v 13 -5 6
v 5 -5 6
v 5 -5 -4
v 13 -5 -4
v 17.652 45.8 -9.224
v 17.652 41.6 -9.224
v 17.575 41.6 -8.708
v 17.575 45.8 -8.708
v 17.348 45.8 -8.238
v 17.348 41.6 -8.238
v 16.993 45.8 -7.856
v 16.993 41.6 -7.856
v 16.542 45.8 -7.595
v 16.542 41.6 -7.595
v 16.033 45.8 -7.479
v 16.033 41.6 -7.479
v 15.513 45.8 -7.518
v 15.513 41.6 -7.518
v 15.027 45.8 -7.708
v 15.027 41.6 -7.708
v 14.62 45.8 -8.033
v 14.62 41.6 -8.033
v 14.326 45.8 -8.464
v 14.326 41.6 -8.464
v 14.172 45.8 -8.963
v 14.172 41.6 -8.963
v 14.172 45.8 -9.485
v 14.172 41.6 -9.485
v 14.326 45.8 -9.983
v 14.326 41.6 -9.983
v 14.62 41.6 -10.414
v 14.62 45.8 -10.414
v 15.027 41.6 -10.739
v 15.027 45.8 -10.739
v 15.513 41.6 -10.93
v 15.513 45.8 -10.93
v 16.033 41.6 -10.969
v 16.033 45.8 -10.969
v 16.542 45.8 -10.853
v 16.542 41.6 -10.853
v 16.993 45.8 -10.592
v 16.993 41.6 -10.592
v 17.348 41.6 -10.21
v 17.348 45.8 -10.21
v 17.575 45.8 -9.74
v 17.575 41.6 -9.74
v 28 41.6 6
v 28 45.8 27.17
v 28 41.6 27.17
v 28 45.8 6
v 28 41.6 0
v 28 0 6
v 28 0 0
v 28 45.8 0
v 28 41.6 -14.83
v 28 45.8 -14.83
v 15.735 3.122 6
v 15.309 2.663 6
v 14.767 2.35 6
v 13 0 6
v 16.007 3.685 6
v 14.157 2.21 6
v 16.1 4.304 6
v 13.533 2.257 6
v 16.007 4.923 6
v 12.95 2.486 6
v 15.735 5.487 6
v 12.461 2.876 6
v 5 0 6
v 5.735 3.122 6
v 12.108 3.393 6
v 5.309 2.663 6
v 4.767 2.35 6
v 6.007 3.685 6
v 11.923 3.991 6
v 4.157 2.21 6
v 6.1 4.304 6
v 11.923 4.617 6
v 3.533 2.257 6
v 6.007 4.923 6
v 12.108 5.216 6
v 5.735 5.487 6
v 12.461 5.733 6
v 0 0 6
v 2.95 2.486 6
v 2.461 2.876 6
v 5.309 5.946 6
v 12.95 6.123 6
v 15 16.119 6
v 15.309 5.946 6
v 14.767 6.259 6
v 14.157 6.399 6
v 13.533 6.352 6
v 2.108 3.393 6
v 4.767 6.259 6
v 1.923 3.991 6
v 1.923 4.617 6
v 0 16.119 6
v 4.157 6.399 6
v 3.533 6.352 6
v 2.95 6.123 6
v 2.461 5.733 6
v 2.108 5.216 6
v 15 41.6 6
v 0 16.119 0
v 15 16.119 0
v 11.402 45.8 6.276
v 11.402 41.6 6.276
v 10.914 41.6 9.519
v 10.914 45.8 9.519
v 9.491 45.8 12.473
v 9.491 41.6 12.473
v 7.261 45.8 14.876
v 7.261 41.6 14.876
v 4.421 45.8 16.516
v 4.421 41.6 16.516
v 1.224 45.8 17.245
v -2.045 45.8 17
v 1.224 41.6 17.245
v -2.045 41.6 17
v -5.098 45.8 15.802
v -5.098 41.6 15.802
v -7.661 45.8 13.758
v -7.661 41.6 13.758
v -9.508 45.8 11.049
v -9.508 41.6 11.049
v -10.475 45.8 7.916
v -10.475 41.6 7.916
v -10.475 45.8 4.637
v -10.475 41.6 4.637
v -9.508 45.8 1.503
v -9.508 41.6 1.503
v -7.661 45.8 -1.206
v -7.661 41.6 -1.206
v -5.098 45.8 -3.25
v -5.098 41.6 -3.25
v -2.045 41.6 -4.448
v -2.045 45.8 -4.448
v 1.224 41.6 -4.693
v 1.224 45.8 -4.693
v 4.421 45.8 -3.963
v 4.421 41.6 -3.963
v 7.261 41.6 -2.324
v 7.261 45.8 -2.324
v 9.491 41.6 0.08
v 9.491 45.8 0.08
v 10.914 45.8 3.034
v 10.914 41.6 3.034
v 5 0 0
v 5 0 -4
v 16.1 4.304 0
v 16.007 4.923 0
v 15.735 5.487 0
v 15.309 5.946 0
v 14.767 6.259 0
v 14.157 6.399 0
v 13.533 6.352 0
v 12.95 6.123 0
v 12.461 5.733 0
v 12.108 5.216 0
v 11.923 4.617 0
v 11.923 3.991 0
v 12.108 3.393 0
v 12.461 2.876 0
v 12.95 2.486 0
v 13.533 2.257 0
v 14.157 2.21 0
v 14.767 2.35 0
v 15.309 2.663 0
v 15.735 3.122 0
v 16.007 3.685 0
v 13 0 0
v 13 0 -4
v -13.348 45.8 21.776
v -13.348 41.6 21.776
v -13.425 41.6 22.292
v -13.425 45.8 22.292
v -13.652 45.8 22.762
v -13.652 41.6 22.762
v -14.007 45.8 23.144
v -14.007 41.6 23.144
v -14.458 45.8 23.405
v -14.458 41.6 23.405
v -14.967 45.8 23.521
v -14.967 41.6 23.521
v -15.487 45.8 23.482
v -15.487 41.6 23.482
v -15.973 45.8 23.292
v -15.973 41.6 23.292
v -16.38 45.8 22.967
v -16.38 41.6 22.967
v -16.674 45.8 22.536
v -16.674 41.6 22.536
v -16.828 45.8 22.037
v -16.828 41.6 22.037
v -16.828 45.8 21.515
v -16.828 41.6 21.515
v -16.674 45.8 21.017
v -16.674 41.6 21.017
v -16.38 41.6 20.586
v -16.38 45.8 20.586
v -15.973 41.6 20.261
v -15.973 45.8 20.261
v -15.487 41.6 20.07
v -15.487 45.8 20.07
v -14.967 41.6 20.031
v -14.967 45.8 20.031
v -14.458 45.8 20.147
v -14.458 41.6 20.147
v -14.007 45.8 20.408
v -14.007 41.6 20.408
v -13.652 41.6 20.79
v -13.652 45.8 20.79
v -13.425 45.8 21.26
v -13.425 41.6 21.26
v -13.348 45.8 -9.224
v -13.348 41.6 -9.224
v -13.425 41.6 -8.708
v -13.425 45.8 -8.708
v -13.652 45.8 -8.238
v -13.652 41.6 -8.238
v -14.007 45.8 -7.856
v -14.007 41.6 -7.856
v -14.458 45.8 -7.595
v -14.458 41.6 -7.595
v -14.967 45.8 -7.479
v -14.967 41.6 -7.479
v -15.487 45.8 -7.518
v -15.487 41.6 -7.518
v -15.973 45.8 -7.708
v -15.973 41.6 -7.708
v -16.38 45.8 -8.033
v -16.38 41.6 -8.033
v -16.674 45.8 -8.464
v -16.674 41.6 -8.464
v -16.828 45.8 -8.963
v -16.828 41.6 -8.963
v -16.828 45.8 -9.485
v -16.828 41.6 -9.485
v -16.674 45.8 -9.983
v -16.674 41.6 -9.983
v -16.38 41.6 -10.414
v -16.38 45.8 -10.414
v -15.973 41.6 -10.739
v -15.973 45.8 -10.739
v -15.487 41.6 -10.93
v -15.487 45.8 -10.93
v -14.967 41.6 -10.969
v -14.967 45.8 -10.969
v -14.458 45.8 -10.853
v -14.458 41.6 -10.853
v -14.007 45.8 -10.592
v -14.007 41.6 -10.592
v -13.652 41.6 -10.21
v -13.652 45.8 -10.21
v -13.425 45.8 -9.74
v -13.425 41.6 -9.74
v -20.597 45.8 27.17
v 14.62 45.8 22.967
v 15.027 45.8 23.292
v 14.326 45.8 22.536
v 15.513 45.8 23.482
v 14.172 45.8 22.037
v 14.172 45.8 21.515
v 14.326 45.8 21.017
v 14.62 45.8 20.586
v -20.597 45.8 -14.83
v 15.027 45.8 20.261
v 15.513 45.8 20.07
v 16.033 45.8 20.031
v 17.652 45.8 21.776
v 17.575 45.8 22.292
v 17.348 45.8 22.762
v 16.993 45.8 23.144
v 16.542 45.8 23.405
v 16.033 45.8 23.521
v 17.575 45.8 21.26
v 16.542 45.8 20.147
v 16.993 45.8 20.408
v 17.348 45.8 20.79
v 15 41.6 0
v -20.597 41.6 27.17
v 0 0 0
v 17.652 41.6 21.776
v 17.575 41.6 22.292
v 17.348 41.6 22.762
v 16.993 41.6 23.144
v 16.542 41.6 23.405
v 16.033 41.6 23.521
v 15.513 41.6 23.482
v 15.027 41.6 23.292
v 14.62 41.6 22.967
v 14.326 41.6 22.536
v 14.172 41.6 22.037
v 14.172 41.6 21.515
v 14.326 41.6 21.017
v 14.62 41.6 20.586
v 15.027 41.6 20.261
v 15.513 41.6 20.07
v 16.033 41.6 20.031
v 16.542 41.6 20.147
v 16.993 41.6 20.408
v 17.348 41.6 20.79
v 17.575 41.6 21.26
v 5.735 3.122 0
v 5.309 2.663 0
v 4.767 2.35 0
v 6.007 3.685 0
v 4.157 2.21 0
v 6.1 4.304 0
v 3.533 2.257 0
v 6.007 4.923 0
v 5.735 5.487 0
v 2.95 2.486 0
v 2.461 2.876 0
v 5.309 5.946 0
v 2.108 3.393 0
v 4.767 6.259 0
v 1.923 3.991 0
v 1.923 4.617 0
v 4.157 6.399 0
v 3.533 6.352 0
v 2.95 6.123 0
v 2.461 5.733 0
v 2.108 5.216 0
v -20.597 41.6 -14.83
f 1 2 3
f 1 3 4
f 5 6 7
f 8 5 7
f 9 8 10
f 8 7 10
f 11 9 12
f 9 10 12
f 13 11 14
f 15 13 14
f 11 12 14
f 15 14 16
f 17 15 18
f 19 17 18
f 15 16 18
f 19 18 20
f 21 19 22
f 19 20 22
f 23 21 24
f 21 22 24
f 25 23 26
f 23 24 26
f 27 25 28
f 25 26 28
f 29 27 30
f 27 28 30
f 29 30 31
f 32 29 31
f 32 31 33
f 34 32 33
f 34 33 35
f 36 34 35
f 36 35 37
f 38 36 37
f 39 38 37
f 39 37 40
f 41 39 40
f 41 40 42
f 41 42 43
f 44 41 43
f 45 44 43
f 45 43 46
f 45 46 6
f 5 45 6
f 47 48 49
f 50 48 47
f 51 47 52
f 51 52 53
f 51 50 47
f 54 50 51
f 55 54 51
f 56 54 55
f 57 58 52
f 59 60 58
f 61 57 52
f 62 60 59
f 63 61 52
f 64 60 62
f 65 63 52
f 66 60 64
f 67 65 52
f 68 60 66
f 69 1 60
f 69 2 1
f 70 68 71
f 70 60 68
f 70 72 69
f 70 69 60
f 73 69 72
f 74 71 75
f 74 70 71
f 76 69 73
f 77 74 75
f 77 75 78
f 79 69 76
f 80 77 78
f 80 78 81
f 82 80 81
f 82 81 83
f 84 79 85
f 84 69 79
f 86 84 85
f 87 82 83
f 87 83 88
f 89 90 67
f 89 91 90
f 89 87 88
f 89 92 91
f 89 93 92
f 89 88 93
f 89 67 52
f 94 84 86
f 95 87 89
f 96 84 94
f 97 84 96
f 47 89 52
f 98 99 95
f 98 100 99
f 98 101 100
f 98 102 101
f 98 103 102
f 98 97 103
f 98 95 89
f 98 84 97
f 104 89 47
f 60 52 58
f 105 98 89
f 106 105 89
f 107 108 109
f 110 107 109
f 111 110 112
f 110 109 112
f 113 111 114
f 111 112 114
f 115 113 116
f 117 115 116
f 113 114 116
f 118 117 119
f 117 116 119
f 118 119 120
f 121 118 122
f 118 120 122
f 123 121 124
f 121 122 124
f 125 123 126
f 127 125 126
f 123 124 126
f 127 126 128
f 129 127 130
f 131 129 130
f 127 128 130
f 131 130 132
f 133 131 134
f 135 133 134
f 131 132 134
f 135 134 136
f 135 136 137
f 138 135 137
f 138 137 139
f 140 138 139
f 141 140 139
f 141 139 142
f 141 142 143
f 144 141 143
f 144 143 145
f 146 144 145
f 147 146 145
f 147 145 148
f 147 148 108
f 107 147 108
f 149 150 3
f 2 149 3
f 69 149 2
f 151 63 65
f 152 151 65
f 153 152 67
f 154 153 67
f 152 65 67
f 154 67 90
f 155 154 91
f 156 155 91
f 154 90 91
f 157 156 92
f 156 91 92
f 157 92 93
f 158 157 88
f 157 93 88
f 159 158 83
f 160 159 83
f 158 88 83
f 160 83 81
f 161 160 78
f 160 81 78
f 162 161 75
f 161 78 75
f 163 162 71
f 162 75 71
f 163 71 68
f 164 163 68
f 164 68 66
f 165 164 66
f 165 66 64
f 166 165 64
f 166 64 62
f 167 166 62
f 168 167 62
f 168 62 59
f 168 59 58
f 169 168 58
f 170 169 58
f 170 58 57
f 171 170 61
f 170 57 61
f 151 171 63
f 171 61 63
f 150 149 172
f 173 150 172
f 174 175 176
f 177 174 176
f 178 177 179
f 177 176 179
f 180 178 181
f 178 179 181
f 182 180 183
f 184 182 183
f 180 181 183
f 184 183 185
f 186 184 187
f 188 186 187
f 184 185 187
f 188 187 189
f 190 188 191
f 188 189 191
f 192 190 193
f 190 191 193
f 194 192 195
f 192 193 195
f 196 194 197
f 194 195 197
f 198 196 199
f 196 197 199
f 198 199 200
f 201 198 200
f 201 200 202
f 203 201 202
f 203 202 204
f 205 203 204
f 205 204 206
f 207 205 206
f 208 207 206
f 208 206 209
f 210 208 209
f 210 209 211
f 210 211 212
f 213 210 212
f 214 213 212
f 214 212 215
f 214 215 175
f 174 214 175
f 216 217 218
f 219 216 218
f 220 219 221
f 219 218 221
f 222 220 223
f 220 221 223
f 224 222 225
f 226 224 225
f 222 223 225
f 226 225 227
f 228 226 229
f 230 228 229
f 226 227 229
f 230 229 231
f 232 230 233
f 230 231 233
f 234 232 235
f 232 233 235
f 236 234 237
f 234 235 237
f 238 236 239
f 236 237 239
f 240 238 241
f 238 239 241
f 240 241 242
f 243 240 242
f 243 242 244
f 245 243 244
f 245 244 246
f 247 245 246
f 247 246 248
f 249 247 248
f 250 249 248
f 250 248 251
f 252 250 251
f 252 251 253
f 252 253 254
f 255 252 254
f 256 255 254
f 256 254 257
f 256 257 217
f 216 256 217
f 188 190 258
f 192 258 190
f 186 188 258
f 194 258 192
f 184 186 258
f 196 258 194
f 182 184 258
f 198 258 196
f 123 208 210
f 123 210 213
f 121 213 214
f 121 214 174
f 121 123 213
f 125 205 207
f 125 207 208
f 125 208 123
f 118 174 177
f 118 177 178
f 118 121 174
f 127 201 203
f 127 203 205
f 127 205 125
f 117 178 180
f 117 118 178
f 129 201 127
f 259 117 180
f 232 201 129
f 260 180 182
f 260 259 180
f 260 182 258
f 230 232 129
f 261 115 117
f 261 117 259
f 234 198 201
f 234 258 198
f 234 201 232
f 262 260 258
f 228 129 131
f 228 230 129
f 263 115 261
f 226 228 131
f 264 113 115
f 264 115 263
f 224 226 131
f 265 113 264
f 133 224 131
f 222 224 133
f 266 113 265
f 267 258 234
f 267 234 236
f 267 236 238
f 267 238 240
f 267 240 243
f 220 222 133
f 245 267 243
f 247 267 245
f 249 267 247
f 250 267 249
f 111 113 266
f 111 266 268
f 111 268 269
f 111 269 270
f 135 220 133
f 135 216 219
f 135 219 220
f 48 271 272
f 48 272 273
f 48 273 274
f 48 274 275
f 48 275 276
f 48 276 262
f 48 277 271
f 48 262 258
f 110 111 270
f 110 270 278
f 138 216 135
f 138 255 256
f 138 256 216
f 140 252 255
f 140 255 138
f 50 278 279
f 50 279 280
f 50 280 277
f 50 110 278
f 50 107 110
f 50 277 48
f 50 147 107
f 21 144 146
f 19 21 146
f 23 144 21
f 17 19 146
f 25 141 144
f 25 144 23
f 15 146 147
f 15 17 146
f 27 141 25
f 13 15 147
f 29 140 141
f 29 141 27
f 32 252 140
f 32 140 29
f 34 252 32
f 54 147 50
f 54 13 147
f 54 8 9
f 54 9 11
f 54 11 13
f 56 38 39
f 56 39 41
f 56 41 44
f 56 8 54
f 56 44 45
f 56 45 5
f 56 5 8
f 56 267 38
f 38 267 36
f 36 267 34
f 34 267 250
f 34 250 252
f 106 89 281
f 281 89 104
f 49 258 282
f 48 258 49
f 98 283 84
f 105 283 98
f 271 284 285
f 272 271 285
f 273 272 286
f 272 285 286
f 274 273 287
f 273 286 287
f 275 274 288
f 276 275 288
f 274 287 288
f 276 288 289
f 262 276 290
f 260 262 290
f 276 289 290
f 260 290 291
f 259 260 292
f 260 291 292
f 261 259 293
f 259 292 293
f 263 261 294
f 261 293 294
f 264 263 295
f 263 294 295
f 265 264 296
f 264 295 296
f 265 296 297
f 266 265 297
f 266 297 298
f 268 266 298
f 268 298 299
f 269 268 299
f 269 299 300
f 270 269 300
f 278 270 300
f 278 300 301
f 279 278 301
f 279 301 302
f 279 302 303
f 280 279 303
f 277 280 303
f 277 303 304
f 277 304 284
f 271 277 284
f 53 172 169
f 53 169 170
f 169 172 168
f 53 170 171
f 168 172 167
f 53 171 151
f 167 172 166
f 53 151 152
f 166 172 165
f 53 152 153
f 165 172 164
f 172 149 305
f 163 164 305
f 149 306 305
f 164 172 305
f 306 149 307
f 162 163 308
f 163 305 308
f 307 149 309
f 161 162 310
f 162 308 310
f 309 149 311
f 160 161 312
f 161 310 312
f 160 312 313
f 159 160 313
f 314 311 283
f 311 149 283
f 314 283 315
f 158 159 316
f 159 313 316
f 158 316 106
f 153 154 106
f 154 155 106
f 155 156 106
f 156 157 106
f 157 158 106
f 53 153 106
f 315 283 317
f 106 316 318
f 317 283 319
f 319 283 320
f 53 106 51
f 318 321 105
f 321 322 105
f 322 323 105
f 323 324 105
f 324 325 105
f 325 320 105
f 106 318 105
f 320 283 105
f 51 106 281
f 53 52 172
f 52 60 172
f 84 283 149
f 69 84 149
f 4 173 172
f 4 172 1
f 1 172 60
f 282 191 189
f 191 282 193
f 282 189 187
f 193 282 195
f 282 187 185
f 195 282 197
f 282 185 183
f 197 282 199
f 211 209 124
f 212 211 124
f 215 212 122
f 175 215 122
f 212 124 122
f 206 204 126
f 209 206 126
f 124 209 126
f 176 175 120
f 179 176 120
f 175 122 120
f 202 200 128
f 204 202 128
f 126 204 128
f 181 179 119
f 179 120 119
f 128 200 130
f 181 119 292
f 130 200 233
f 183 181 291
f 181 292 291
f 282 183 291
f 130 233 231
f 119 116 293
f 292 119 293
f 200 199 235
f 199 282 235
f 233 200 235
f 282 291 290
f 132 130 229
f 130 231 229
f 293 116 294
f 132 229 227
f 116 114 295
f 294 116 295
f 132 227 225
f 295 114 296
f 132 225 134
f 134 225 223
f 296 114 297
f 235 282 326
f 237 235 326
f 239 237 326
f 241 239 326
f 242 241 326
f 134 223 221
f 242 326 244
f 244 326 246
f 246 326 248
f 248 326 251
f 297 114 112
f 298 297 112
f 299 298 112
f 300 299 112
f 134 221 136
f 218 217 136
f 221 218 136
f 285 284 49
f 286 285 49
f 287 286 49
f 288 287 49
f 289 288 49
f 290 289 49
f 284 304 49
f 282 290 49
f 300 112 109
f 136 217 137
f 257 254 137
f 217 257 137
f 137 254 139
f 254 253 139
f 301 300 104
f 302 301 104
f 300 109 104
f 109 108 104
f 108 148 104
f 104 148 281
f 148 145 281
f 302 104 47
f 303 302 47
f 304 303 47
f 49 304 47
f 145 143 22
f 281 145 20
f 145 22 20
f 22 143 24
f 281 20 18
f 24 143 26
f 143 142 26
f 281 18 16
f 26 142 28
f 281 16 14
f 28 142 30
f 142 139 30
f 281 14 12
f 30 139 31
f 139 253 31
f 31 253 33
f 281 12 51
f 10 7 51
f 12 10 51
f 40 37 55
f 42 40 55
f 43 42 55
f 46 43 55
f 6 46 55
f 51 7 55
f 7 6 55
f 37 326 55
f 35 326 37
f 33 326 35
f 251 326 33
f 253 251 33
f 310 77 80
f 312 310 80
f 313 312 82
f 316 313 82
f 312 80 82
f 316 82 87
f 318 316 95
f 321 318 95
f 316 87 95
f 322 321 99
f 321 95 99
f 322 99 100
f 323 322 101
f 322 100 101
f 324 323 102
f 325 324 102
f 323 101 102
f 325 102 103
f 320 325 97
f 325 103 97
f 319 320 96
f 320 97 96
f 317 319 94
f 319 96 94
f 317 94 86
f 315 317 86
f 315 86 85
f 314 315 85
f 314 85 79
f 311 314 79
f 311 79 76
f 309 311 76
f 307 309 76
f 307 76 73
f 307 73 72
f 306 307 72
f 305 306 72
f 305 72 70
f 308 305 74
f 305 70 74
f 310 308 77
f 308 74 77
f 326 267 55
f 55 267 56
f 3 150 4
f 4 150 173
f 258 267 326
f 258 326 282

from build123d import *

# Parameters (mm, degrees)
SKETCH_1_W          = 18
SKETCH_1_H          = 50
EXTRUDE_1_DEPTH     = 6
SKETCH_3_R          = 2.1
CUT_EXTRUDE_2_DEPTH = 6
SKETCH_4_W          = 8
SKETCH_4_H          = 10
EXTRUDE_2_DEPTH     = 5
SKETCH_5_W          = 6
SKETCH_5_H          = 50
EXTRUDE_3_DEPTH     = 10
SKETCH_6_W          = 15
SKETCH_6_H          = 33.880633875
CUT_EXTRUDE_3_DEPTH = 10
SKETCH_7_W          = 18.194641251
SKETCH_7_H          = 8.438338953
CUT_EXTRUDE_4_DEPTH = 4.2
SKETCH_8_W          = 58.547266504
SKETCH_8_H          = 42
EXTRUDE_4_DEPTH     = 4.2
SKETCH_9_W          = 49.225807408
SKETCH_9_H          = 6.051517764
CUT_EXTRUDE_5_DEPTH = 9.95
SKETCH_15_R         = 1.75
CUT_EXTRUDE_6_DEPTH = 9.95
SKETCH_16_R         = 11
CUT_EXTRUDE_7_DEPTH = 10


with BuildPart() as part:
    # 草图1 → 凸台-拉伸1 (new body)
    with BuildSketch(Plane.XY):
        with Locations((9, 25)):
            Rectangle(SKETCH_1_W, SKETCH_1_H)
    extrude(amount=EXTRUDE_1_DEPTH)

    # 草图3 → 切除-拉伸2 (cut)
    with BuildSketch(Plane.XY.offset(6)):
        with Locations((4, 4.30447472)):
            Circle(SKETCH_3_R)
        with Locations((14, 4.30447472)):
            Circle(SKETCH_3_R)
    extrude(amount=-CUT_EXTRUDE_2_DEPTH, mode=Mode.SUBTRACT)

    # 草图4 → 凸台-拉伸2 (add)
    with BuildSketch(Plane.XZ):
        with Locations((9, 1)):
            Rectangle(SKETCH_4_W, SKETCH_4_H)
    extrude(amount=EXTRUDE_2_DEPTH)

    # 草图5 → 凸台-拉伸3 (add)
    with BuildSketch(Plane(origin=(18, 0, 0), x_dir=(0, 0, -1), z_dir=(1, 0, 0))):
        with Locations((-3, 25)):
            Rectangle(SKETCH_5_W, SKETCH_5_H)
    extrude(amount=EXTRUDE_3_DEPTH)

    # 草图6 → 切除-拉伸3 (cut)
    with BuildSketch(Plane.XY.offset(6)):
        with Locations((7.5, 33.059683062)):
            Rectangle(SKETCH_6_W, SKETCH_6_H)
    extrude(amount=-CUT_EXTRUDE_3_DEPTH, mode=Mode.SUBTRACT)

    # 草图7 → 切除-拉伸4 (cut)
    with BuildSketch(Plane(origin=(0, 50, 0), x_dir=(1, 0, 0), z_dir=(0, 1, 0))):
        with Locations((18.902679374, -1.780830523)):
            Rectangle(SKETCH_7_W, SKETCH_7_H)
    extrude(amount=-CUT_EXTRUDE_4_DEPTH, mode=Mode.SUBTRACT)

    # 草图8 → 凸台-拉伸4 (add)
    with BuildSketch(Plane(origin=(0, 45.8, 0), x_dir=(1, 0, 0), z_dir=(0, 1, 0))):
        with Locations((-1.273633252, -6.17)):
            Rectangle(SKETCH_8_W, SKETCH_8_H)
    extrude(amount=-EXTRUDE_4_DEPTH)

    # 草图9 → 切除-拉伸5 (cut)
    with BuildSketch(Plane.ZY.offset(30.547266504)):
        with Locations((2.557096296, 42.774241118)):
            Rectangle(SKETCH_9_W, SKETCH_9_H)
    extrude(amount=-CUT_EXTRUDE_5_DEPTH, mode=Mode.SUBTRACT)

    # 草图15 → 切除-拉伸6 (cut)
    with BuildSketch(Plane.XZ.offset(-41.6)):
        with Locations((15.90237217, -9.22379542)):
            Circle(SKETCH_15_R)
        with Locations((-15.09762783, -9.22379542)):
            Circle(SKETCH_15_R)
        with Locations((15.90237217, 21.77620458)):
            Circle(SKETCH_15_R)
        with Locations((-15.09762783, 21.77620458)):
            Circle(SKETCH_15_R)
    extrude(amount=-CUT_EXTRUDE_6_DEPTH, mode=Mode.SUBTRACT)

    # 草图16 → 切除-拉伸7 (cut)
    with BuildSketch(Plane.XZ.offset(-41.6)):
        with Locations((0.40237217, 6.27620458)):
            Circle(SKETCH_16_R)
    extrude(amount=-CUT_EXTRUDE_7_DEPTH, mode=Mode.SUBTRACT)


solid = part.part
